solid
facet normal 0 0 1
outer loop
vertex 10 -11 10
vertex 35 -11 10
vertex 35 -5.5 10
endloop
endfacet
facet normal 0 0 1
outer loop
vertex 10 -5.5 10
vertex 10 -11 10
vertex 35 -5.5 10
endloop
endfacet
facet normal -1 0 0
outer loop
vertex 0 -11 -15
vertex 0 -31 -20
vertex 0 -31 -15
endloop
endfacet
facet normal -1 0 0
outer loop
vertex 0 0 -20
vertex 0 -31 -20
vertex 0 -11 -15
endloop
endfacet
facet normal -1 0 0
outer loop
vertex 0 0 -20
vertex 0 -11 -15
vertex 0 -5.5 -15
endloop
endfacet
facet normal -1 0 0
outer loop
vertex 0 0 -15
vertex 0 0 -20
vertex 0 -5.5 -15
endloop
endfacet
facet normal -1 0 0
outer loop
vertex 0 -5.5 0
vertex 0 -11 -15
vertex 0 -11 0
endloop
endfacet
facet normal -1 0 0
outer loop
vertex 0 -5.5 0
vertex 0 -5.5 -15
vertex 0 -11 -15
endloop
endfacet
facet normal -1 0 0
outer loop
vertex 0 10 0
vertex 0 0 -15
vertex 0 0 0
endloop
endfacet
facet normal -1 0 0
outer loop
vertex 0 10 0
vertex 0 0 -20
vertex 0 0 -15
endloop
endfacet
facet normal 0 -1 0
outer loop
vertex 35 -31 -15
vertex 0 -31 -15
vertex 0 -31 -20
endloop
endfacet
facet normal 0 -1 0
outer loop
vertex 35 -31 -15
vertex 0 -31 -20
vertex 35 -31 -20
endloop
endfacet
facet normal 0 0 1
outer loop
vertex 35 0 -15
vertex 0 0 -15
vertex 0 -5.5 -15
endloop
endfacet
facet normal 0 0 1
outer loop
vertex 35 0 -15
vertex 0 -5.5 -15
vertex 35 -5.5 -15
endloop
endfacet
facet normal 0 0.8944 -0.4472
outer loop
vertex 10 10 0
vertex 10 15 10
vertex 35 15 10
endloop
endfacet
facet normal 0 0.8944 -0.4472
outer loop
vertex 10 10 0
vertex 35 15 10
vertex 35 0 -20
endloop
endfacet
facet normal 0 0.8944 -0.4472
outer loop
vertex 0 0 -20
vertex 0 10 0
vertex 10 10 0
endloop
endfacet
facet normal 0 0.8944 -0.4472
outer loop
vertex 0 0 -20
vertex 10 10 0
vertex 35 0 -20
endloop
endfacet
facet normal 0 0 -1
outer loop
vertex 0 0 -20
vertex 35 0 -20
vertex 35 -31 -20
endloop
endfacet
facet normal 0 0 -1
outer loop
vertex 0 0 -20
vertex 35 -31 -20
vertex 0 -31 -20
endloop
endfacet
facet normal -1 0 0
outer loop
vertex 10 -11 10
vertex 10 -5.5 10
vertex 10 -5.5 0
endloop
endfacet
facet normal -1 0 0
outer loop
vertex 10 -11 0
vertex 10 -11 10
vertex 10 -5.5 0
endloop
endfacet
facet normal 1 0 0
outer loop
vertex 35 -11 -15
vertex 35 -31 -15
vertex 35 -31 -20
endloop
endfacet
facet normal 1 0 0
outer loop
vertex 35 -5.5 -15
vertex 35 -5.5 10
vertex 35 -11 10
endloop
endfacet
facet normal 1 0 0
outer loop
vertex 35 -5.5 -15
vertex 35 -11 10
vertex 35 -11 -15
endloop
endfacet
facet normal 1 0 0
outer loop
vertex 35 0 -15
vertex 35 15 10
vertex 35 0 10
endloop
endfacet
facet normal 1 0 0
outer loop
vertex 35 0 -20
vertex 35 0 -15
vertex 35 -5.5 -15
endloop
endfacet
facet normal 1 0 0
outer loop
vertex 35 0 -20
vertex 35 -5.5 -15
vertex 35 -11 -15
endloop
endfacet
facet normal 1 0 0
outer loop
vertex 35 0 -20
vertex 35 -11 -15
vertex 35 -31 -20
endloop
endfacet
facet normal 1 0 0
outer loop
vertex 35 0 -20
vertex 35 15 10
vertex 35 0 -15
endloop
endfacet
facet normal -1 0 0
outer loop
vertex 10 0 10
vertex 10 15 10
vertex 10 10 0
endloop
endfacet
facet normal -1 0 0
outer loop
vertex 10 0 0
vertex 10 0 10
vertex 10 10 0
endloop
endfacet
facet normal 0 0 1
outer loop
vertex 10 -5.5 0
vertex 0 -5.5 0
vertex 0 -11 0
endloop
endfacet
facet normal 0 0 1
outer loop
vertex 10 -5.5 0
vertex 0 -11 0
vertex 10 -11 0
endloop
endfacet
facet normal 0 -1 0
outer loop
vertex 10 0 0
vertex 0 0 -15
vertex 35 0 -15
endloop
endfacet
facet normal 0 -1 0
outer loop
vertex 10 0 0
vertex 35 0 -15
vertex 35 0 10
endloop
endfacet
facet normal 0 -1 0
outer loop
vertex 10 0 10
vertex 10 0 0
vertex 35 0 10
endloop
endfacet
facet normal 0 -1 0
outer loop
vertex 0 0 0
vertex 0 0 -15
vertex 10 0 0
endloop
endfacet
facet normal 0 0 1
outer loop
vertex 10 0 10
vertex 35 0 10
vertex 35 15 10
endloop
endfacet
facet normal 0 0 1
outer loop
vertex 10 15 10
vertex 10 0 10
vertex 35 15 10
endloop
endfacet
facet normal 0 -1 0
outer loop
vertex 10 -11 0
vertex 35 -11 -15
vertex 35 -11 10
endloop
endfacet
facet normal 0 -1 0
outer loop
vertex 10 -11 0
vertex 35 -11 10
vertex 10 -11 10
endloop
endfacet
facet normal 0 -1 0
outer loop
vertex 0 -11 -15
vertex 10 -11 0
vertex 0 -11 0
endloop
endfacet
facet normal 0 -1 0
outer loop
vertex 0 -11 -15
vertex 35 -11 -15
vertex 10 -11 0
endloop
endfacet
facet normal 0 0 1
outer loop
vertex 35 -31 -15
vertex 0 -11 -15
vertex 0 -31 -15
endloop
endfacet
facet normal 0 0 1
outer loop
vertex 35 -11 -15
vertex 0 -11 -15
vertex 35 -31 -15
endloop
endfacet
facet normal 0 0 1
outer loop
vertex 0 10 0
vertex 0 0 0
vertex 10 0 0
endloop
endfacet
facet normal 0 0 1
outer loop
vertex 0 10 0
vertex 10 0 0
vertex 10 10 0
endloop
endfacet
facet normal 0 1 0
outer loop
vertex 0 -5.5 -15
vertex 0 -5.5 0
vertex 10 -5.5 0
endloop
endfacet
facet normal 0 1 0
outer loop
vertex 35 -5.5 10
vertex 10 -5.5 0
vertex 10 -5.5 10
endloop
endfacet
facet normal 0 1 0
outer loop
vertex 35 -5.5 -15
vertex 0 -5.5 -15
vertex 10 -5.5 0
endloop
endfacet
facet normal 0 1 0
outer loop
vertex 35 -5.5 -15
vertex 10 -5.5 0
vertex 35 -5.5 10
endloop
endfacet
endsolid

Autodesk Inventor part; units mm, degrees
ref_plane "YZ Plane" through (0, 0, 0) normal (1, 0, 0) x (0, 1, 0)
ref_plane "XZ Plane" through (0, 0, 0) normal (0, 1, 0) x (-1, 0, 0)
ref_plane "XY Plane" through (0, 0, 0) normal (0, 0, 1) x (1, 0, 0)
sketch "Sketch1" plane through (0, 0, 0) normal (1, 0, 0) x (0, 1, 0)
  line L0 (0, 0) -> (10, 0)
  line L1 (10, 0) -> (0, -20)
  line L2 (0, -20) -> (0, 0)
  dimension "d0" = 20
  dimension "d1" = 10
extrude "Extrusion1" add sketch "Sketch1" along normal blind 35
sketch "Sketch7" plane through (0, 0, -20) normal (0, -1, 0) x (1, 0, 0)
  line L0 (35, 20) -> (35, 0) projected
  line L1 (0, 0) -> (0, 20) projected
  line L2 (35, 0) -> (0, 0)
  line L3 (0, 0) -> (0, 5)
  line L4 (0, 5) -> (35, 5)
  line L5 (35, 5) -> (35, 0)
  dimension "d17" = 5
extrude "Extrusion7" add sketch "Sketch7" along normal blind 11
sketch "Sketch8" plane through (0, 0, -15) normal (0, 0, 1) x (1, 0, 0)
  line L0 (35, -11) -> (0, -11)
  line L1 (0, -11) -> (0, -5.5)
  line L2 (0, -5.5) -> (35, -5.5)
  line L3 (35, -5.5) -> (35, -11)
  point P0 (0, 0)
  dimension "d20" = 5.5
  dimension "d26" = 35
extrude "Extrusion8" add sketch "Sketch8" along normal blind 15
sketch "Sketch9" plane through (0, -11, -20) normal (0, -1, 0) x (1, 0, 0)
  line L0 (0, 5) -> (0, 20) projected
  line L1 (35, 0) -> (0, 0)
  line L2 (0, 0) -> (0, 5)
  line L3 (0, 5) -> (35, 5)
  line L4 (35, 5) -> (35, 0)
  dimension "d23" = 5
extrude "Extrusion9" add sketch "Sketch9" along normal blind 20
sketch "Sketch10" plane through (35, 0, 0) normal (1, 0, 0) x (0, 0, -1)
  line L0 (15, 0) -> (0, 0) projected
  line L1 (0, 0) -> (-10, 0)
  line L2 (0, -11) -> (-10, -11)
  line L3 (-10, -11) -> (-10, -5.5)
  line L4 (-10, -5.5) -> (0, -5.5)
  line L5 (0, -5.5) -> (0, -11)
  line L6 (0, 10) -> (20, 0) projected
  line L7 (0, 10) -> (-10, 15)
  line L8 (20, 0) -> (0, 10) projected
  line L9 (-10, 0) -> (-10, 15)
  line L10 (0, 0) -> (0, 10) projected
  line L11 (0, 0) -> (0, 10)
  dimension "d27" = 10
  dimension "d30" = 10
extrude "Extrusion10" add sketch "Sketch10" against normal blind 25
properties part number "Ooze_Ramp_Top"
